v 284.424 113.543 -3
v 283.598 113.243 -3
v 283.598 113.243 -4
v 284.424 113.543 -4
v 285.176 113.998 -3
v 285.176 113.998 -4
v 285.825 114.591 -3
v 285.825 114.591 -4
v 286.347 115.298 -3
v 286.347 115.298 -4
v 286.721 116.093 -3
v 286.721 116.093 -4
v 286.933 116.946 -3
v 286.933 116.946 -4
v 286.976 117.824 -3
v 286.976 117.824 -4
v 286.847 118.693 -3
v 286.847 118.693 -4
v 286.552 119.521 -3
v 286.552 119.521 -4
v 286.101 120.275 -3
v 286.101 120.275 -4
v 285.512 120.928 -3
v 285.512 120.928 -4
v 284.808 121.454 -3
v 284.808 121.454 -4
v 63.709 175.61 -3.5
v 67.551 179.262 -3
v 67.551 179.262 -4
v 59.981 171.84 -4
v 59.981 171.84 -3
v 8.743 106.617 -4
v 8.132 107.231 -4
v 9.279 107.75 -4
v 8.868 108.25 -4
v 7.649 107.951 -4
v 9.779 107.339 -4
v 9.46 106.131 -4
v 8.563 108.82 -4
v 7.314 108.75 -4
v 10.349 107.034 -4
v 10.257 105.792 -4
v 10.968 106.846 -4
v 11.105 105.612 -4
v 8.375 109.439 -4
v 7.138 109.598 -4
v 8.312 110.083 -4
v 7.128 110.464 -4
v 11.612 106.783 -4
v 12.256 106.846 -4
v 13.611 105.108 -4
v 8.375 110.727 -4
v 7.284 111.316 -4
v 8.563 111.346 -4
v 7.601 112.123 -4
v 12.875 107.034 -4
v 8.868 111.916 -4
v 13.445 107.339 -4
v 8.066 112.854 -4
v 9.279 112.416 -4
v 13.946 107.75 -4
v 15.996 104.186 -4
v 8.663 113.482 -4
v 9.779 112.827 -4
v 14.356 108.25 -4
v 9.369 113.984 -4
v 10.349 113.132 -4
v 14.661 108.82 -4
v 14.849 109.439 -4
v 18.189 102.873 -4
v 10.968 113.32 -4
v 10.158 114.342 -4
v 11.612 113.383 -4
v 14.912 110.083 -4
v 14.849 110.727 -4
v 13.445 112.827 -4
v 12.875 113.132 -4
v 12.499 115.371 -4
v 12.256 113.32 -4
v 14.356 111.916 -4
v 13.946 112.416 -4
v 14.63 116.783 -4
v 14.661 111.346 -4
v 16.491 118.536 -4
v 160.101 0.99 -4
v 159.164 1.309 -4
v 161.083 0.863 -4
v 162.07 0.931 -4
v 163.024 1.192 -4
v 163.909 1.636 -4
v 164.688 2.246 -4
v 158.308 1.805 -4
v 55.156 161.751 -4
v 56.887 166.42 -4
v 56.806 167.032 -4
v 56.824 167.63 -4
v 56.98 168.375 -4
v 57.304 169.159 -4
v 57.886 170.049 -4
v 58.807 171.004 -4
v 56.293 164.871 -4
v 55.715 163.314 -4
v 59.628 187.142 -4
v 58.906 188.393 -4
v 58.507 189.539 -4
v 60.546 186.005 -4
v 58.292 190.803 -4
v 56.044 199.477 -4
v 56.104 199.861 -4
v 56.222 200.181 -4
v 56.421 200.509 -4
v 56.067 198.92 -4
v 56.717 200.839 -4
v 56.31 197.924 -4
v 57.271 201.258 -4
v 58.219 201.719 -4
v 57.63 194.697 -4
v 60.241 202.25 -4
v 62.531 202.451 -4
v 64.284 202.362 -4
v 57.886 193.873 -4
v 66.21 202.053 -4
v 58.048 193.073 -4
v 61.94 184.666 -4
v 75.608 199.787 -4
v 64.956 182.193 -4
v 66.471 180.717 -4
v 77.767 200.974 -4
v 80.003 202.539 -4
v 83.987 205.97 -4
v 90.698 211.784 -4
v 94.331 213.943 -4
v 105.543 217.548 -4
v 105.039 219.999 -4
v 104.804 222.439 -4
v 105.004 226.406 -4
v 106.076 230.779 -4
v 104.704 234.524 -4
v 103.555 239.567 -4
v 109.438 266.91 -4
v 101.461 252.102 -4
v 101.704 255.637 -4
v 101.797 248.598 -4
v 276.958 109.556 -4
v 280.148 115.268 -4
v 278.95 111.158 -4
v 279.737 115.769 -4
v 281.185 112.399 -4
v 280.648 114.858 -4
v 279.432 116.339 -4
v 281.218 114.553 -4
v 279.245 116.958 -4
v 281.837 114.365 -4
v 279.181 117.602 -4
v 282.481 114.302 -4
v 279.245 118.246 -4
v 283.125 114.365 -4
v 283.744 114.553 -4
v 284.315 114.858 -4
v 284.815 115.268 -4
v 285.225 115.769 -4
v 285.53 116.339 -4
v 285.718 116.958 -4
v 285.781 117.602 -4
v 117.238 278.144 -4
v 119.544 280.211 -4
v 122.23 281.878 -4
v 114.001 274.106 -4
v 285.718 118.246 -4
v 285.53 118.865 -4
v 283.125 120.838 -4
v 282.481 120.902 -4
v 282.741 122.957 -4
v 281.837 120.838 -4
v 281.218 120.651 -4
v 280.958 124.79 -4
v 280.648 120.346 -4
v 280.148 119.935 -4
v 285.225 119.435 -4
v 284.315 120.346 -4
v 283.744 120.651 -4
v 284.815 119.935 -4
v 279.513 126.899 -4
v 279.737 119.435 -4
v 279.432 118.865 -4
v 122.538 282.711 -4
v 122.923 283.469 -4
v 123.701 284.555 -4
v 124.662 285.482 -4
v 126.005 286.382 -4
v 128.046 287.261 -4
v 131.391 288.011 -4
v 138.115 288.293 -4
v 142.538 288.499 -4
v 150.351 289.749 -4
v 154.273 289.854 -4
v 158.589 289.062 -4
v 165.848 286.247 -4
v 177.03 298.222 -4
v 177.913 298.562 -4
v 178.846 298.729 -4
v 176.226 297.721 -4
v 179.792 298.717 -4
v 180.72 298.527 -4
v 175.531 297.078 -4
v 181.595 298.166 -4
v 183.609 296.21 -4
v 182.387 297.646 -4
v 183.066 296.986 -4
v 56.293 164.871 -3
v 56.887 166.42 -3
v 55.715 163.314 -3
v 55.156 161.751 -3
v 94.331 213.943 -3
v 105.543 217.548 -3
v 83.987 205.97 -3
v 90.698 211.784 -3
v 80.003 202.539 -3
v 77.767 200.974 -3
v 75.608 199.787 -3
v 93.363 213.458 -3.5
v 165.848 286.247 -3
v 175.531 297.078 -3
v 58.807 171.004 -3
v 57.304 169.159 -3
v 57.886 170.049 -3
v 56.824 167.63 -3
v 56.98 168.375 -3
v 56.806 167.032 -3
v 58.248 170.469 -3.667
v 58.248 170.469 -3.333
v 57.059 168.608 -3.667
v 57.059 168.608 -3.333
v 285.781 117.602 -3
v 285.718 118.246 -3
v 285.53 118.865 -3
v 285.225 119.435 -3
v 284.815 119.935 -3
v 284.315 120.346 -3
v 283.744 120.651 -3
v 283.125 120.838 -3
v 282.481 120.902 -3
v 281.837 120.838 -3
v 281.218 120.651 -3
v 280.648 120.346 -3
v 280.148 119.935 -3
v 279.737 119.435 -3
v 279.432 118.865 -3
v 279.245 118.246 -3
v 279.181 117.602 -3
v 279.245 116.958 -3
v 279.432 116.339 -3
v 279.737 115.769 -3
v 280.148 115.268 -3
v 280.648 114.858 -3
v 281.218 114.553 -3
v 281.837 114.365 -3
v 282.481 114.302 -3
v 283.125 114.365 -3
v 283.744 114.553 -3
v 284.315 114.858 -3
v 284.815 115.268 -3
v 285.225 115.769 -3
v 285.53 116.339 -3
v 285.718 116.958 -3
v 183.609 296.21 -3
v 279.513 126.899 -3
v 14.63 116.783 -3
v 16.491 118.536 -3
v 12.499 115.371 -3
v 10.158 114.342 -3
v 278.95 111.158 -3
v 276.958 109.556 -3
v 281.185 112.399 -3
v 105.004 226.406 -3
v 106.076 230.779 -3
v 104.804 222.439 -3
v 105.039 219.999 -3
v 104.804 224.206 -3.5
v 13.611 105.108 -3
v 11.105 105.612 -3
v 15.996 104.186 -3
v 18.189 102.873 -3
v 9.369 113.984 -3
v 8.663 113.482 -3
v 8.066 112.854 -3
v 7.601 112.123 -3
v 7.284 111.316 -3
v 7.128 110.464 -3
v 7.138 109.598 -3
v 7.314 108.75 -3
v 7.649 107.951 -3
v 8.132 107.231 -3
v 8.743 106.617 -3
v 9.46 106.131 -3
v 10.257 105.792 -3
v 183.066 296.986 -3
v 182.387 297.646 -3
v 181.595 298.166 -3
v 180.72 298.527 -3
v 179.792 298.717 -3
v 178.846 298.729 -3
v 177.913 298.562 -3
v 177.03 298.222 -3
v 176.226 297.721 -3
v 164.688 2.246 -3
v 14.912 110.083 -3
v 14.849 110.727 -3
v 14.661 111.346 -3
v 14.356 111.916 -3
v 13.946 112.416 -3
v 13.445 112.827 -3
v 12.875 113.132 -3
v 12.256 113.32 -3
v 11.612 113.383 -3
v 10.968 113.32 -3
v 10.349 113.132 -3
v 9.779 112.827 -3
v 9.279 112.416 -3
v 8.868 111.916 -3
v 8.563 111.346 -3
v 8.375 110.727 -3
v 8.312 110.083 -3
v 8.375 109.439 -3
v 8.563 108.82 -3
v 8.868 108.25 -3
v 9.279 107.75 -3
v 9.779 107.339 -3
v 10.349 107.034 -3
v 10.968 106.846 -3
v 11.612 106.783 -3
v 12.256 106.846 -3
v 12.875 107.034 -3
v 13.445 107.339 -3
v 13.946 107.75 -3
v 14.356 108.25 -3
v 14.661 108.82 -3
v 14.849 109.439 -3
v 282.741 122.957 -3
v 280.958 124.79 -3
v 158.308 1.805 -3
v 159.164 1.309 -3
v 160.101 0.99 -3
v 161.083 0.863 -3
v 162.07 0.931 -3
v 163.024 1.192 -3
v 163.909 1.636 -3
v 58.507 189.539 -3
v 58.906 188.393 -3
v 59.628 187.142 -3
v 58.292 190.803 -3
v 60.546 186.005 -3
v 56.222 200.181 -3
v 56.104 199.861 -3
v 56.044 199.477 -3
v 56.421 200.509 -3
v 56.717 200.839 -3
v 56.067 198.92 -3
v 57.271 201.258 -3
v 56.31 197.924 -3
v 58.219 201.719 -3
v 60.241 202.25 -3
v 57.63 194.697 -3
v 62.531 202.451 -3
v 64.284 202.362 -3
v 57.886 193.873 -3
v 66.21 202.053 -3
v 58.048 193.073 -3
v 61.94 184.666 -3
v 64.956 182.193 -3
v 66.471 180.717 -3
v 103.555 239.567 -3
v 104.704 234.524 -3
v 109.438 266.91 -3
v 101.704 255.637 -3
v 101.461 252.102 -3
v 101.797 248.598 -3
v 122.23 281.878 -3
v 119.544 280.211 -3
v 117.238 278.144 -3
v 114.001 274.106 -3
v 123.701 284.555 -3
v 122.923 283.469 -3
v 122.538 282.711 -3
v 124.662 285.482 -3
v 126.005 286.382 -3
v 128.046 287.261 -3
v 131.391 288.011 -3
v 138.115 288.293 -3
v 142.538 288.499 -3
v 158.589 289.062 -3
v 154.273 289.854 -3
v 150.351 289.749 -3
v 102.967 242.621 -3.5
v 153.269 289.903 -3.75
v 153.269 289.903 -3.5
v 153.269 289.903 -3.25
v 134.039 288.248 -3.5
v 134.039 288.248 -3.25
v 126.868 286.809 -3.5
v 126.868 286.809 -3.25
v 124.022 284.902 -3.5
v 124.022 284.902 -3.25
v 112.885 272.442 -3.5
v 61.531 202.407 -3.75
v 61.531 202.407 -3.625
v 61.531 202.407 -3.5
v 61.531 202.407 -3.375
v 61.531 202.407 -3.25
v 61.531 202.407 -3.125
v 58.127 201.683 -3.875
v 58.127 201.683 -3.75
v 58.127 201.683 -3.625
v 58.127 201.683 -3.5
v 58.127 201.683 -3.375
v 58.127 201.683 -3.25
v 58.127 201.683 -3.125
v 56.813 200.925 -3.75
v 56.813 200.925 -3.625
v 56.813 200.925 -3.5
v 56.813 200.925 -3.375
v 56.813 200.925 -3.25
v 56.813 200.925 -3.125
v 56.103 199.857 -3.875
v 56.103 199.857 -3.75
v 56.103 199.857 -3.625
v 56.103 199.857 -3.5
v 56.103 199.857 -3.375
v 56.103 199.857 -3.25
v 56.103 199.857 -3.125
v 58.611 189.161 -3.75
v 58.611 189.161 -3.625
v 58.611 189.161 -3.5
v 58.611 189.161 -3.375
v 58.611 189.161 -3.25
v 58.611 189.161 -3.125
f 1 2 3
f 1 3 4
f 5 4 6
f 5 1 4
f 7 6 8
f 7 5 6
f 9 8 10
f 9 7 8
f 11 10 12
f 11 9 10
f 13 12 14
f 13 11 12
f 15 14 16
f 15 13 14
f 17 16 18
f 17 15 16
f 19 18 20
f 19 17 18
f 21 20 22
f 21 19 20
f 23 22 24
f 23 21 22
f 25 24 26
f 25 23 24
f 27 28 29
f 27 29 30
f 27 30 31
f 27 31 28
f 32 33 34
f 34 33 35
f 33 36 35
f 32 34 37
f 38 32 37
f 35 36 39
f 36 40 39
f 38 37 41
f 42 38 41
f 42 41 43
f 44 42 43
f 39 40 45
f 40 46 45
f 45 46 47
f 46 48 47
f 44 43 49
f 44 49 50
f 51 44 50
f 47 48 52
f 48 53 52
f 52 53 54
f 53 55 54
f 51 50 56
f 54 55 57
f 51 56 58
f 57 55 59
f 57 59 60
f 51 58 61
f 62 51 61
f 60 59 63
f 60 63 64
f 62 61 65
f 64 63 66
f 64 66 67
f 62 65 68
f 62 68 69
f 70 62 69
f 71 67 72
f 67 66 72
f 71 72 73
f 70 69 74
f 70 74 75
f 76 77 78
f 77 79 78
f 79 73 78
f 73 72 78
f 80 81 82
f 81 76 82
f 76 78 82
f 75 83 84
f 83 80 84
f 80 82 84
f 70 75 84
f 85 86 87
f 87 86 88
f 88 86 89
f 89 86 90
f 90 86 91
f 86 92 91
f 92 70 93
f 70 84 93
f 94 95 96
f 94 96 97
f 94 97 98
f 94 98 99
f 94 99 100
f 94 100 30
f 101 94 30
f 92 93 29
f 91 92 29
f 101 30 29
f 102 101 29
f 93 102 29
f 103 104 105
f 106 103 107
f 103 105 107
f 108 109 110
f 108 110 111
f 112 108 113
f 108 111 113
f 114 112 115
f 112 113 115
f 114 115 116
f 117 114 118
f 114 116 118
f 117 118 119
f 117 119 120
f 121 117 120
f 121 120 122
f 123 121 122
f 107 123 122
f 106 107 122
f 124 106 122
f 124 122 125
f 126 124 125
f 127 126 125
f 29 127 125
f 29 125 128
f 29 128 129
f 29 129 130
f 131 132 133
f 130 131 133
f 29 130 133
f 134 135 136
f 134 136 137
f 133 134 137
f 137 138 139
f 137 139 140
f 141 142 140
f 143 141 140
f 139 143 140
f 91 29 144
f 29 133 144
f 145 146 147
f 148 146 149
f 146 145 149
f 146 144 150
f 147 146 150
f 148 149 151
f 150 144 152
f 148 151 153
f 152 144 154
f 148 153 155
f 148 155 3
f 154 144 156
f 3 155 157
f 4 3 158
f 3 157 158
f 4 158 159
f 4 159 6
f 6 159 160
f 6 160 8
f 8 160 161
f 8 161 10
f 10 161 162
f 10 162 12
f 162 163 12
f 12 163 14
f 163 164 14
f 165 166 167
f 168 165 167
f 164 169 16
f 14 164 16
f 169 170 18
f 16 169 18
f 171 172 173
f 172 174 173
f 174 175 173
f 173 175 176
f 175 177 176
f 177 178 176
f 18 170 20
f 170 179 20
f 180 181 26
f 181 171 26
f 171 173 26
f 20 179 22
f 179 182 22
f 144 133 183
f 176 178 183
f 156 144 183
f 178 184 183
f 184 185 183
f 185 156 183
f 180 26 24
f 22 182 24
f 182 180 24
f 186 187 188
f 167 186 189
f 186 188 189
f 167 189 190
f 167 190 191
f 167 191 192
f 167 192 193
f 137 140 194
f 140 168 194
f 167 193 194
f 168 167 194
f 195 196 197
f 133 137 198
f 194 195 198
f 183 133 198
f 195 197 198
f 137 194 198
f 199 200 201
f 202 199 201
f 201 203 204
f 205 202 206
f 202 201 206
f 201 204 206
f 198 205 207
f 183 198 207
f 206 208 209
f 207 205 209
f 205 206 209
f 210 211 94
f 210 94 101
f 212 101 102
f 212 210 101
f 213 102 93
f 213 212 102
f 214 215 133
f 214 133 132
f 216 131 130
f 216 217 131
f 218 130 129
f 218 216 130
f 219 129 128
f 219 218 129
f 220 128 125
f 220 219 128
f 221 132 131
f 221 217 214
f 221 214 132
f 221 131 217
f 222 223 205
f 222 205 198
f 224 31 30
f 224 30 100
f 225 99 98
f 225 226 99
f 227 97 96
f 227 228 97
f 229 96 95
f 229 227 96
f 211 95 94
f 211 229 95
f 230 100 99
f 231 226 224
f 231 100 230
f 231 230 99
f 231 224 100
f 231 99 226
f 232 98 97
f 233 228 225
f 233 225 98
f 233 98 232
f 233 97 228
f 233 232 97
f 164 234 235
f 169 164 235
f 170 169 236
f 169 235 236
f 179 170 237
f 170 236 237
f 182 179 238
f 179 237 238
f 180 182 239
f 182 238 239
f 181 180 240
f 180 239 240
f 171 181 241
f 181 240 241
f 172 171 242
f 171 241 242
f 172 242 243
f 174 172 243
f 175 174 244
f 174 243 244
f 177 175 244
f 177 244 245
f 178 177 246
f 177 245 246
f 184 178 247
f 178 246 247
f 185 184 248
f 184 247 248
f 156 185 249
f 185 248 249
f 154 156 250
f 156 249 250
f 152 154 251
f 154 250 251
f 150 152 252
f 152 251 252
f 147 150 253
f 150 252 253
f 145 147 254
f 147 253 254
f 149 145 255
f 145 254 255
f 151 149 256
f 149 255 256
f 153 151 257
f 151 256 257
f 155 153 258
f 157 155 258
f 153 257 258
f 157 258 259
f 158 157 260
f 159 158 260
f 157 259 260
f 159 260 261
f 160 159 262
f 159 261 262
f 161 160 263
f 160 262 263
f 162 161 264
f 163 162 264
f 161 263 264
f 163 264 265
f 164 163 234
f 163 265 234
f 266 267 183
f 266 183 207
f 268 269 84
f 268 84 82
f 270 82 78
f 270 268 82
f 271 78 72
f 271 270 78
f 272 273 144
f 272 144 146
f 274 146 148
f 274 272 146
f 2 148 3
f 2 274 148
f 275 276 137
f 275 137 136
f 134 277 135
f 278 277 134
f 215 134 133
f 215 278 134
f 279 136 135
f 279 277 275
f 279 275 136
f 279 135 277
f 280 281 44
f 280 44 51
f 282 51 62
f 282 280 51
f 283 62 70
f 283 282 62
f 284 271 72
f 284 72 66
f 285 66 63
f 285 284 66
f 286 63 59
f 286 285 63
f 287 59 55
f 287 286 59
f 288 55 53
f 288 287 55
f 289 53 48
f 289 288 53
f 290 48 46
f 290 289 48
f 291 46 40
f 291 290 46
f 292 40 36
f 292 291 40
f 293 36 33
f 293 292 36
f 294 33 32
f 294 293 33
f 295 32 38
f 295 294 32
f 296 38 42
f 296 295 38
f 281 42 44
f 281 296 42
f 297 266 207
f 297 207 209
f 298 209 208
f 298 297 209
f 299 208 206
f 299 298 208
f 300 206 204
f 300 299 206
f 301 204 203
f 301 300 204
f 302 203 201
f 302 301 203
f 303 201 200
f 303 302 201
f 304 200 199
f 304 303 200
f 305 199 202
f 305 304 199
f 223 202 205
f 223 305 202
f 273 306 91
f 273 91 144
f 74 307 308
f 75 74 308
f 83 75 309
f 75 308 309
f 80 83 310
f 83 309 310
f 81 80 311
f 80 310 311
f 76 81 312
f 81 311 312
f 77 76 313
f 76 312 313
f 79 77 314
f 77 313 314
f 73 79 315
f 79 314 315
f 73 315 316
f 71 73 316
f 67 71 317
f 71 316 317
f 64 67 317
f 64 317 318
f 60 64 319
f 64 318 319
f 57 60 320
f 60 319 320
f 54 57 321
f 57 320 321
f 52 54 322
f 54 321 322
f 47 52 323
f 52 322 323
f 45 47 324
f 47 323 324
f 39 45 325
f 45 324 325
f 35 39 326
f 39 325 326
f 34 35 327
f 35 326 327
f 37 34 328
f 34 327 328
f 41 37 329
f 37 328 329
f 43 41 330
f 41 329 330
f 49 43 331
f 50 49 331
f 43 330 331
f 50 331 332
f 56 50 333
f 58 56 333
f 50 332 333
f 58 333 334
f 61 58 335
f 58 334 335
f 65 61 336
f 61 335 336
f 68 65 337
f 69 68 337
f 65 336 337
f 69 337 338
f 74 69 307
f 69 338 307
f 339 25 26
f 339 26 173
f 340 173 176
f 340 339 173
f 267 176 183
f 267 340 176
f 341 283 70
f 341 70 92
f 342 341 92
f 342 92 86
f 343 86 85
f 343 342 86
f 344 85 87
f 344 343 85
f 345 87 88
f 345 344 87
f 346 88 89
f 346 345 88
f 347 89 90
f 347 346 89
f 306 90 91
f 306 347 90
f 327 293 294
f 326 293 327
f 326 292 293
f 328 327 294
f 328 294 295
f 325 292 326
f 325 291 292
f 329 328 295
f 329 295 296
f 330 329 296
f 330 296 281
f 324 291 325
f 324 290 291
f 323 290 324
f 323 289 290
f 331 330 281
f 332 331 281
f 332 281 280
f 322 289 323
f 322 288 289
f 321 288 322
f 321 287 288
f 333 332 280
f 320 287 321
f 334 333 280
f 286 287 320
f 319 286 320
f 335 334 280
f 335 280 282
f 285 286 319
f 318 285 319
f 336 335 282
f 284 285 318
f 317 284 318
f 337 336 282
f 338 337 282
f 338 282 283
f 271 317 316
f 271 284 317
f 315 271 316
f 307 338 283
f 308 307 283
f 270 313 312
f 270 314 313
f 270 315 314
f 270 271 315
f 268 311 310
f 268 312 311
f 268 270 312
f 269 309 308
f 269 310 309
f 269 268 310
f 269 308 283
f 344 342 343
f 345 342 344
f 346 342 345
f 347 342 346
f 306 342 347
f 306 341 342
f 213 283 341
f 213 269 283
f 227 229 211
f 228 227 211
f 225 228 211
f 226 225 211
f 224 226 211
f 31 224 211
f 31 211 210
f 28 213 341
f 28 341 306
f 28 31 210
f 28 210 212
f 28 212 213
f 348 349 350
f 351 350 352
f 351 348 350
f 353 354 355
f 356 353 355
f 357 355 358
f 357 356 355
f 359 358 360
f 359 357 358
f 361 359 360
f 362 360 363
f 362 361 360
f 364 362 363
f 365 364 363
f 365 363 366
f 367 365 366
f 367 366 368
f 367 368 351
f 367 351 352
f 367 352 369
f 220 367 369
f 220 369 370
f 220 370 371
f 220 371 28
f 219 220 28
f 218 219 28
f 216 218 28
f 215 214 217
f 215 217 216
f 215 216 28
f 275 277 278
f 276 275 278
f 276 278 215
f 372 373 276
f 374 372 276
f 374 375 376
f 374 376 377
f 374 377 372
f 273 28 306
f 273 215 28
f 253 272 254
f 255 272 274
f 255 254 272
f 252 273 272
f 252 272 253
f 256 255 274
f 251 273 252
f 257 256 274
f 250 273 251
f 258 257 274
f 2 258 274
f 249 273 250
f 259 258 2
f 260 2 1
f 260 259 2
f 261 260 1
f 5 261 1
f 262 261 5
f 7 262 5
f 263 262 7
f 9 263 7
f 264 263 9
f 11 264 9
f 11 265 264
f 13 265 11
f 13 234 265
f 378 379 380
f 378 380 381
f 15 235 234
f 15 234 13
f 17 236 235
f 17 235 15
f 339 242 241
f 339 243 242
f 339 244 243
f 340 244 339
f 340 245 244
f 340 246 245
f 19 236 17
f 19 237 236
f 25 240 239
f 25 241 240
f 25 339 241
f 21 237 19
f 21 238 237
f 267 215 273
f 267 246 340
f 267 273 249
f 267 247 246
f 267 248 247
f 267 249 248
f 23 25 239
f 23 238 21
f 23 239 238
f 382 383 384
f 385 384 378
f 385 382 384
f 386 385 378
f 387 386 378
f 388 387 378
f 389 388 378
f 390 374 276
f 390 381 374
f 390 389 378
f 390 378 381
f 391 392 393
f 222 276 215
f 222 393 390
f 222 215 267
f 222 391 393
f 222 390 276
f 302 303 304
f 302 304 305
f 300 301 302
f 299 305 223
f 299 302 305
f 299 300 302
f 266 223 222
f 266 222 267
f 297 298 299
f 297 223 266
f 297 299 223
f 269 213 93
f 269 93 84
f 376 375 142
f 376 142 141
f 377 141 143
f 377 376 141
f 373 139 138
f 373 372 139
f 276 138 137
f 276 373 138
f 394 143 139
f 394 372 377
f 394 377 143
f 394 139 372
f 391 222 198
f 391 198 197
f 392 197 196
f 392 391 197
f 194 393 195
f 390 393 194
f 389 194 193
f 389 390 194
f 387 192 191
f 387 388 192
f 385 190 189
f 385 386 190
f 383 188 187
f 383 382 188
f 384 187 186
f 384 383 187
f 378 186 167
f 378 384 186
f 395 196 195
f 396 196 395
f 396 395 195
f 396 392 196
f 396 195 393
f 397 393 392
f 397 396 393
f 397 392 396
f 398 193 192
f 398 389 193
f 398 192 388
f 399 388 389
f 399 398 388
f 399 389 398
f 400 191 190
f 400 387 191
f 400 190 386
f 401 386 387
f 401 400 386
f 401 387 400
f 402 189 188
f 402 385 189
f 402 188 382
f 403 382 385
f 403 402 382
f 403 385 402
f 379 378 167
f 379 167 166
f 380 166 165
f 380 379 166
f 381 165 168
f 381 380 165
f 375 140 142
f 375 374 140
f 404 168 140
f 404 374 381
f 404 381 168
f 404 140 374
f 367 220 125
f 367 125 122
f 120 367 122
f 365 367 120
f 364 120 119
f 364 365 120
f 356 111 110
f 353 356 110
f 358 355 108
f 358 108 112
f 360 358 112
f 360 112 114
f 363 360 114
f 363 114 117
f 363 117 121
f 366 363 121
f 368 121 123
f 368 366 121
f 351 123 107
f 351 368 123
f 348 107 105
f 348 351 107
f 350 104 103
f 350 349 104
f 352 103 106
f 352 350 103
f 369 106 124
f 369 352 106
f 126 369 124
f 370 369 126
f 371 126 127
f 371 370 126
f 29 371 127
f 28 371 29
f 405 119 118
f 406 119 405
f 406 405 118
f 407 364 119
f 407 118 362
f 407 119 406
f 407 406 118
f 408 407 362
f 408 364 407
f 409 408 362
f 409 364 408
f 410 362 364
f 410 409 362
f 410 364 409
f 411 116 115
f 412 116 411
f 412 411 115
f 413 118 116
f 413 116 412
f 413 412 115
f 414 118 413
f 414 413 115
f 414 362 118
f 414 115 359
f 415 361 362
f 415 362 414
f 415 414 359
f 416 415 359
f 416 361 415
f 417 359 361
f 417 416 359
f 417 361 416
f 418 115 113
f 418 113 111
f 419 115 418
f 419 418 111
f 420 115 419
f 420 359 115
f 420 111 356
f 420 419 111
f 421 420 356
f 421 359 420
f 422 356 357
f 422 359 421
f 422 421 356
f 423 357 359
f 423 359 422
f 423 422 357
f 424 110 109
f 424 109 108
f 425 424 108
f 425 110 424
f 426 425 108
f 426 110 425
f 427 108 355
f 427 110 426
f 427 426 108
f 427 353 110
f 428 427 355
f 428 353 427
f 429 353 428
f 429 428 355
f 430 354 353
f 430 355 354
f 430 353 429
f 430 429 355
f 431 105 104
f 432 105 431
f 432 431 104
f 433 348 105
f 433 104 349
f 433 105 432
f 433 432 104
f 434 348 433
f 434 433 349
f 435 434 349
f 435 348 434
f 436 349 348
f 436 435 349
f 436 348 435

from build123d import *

# Parameters (mm, degrees)
BOSS_EXTRUDE1_START = -3
SKETCH1_R           = 3.3
BOSS_EXTRUDE1_DEPTH = 1


with BuildPart() as part:
    # Sketch1 → Boss-Extrude1 (new body)
    with BuildSketch(Plane.XY.offset(BOSS_EXTRUDE1_START)):
        with BuildLine():
            Line((175.530545653, 297.078241002), (165.847660098, 286.247140349))
            add(Edge.make_bspline(
                [(165.847660098, 286.247140349), (161.958951275, 288.053215105), (153.7541863, 291.385632032), (142.949710049, 287.922349017), (132.08866755, 288.696875058), (123.730011038, 286.762274271), (122.229813512, 281.878394702)],
                knots=[0, 0, 0, 0, 0.282569956, 0.534959137, 0.697744118, 1, 1, 1, 1], degree=3))
            add(Edge.make_bspline(
                [(122.229813512, 281.878394702), (118.058976155, 279.823016138), (111.235657544, 270.739838071), (106.106560937, 260.813884877), (101.703831056, 255.636584821)],
                knots=[0, 0, 0, 0, 0.398895915, 1, 1, 1, 1], degree=3))
            add(Edge.make_bspline(
                [(101.703831056, 255.636584821), (100.938919323, 251.235797266), (103.183355148, 242.927772517), (104.33056652, 234.543938083), (106.075647572, 230.779395719)],
                knots=[0, 0, 0, 0, 0.517213565, 1, 1, 1, 1], degree=3))
            add(Edge.make_bspline(
                [(106.075647572, 230.779395719), (103.798133299, 224.247937083), (105.543362439, 217.548369999)],
                knots=[0, 0, 0, 1, 1, 1], degree=2))
            add(Edge.make_bspline(
                [(105.543362439, 217.548369999), (101.478949421, 216.275176704), (89.438329667, 214.004143017), (82.364872068, 202.984357934), (75.608431069, 199.787338704)],
                knots=[0, 0, 0, 0, 0.364395461, 1, 1, 1, 1], degree=3))
            add(Edge.make_bspline(
                [(75.608431069, 199.787338704), (72.965008377, 200.448410696), (68.130105896, 201.670017191), (62.019757504, 202.966820343), (54.835011624, 201.049857451), (56.921255323, 196.431484587), (58.321643082, 193.17869111), (58.082321369, 189.161546227), (61.757389476, 184.075704484), (65.851558074, 182.053410846), (67.551159033, 179.262120633)],
                knots=[0, 0, 0, 0, 0.185122606, 0.320265005, 0.454108381, 0.537288926, 0.599177691, 0.700070158, 0.790196975, 1, 1, 1, 1], degree=3))
            add(Edge.make_bspline(
                [(67.551159033, 179.262120633), (63.651335521, 175.669295098), (59.980616164, 171.840128471)],
                knots=[0, 0, 0, 1, 1, 1], degree=2))
            add(Edge.make_bspline(
                [(59.980616164, 171.840128471), (58.13524604, 170.76965569), (56.3909212, 168.715252622), (56.887266336, 166.42033094)],
                knots=[0, 0, 0, 0, 1, 1, 1, 1], degree=3))
            ThreePointArc((56.887266336, 166.42033094), (56.001787201, 164.093208994), (55.156159125, 161.751311683))
            Line((55.156159125, 161.751311683), (16.490969335, 118.53562592))
            ThreePointArc((16.490969335, 118.53562592), (13.594458931, 116.03119733), (10.158239499, 114.341720756))
            ThreePointArc((10.158239499, 114.341720756), (7.138291038, 109.59789587), (11.104930852, 105.61170322))
            ThreePointArc((11.104930852, 105.61170322), (14.823431664, 104.698091272), (18.189463296, 102.87277866))
            Line((18.189463296, 102.87277866), (158.308378587, 1.805164583))
            ThreePointArc((158.308378587, 1.805164583), (161.577939242, 0.872224158), (164.688165503, 2.245867969))
            Line((164.688165503, 2.245867969), (276.957680669, 109.555734945))
            ThreePointArc((276.957680669, 109.555734945), (280.040760403, 111.826539744), (283.598320347, 113.242767948))
            ThreePointArc((283.598320347, 113.242767948), (286.933122885, 116.94588976), (284.808210365, 121.45352394))
            ThreePointArc((284.808210365, 121.45352394), (281.810364375, 123.835719251), (279.51333018, 126.899306851))
            Line((279.51333018, 126.899306851), (183.60866827, 296.210136052))
            ThreePointArc((183.60866827, 296.210136052), (179.792379546, 298.717191637), (175.530545653, 297.078241002))
        make_face()
        with Locations((11.612063393, 110.083035973)):
            Circle(SKETCH1_R, mode=Mode.SUBTRACT)
        with Locations((282.4811963, 117.601900186)):
            Circle(SKETCH1_R, mode=Mode.SUBTRACT)
    extrude(amount=-BOSS_EXTRUDE1_DEPTH)


solid = part.part
